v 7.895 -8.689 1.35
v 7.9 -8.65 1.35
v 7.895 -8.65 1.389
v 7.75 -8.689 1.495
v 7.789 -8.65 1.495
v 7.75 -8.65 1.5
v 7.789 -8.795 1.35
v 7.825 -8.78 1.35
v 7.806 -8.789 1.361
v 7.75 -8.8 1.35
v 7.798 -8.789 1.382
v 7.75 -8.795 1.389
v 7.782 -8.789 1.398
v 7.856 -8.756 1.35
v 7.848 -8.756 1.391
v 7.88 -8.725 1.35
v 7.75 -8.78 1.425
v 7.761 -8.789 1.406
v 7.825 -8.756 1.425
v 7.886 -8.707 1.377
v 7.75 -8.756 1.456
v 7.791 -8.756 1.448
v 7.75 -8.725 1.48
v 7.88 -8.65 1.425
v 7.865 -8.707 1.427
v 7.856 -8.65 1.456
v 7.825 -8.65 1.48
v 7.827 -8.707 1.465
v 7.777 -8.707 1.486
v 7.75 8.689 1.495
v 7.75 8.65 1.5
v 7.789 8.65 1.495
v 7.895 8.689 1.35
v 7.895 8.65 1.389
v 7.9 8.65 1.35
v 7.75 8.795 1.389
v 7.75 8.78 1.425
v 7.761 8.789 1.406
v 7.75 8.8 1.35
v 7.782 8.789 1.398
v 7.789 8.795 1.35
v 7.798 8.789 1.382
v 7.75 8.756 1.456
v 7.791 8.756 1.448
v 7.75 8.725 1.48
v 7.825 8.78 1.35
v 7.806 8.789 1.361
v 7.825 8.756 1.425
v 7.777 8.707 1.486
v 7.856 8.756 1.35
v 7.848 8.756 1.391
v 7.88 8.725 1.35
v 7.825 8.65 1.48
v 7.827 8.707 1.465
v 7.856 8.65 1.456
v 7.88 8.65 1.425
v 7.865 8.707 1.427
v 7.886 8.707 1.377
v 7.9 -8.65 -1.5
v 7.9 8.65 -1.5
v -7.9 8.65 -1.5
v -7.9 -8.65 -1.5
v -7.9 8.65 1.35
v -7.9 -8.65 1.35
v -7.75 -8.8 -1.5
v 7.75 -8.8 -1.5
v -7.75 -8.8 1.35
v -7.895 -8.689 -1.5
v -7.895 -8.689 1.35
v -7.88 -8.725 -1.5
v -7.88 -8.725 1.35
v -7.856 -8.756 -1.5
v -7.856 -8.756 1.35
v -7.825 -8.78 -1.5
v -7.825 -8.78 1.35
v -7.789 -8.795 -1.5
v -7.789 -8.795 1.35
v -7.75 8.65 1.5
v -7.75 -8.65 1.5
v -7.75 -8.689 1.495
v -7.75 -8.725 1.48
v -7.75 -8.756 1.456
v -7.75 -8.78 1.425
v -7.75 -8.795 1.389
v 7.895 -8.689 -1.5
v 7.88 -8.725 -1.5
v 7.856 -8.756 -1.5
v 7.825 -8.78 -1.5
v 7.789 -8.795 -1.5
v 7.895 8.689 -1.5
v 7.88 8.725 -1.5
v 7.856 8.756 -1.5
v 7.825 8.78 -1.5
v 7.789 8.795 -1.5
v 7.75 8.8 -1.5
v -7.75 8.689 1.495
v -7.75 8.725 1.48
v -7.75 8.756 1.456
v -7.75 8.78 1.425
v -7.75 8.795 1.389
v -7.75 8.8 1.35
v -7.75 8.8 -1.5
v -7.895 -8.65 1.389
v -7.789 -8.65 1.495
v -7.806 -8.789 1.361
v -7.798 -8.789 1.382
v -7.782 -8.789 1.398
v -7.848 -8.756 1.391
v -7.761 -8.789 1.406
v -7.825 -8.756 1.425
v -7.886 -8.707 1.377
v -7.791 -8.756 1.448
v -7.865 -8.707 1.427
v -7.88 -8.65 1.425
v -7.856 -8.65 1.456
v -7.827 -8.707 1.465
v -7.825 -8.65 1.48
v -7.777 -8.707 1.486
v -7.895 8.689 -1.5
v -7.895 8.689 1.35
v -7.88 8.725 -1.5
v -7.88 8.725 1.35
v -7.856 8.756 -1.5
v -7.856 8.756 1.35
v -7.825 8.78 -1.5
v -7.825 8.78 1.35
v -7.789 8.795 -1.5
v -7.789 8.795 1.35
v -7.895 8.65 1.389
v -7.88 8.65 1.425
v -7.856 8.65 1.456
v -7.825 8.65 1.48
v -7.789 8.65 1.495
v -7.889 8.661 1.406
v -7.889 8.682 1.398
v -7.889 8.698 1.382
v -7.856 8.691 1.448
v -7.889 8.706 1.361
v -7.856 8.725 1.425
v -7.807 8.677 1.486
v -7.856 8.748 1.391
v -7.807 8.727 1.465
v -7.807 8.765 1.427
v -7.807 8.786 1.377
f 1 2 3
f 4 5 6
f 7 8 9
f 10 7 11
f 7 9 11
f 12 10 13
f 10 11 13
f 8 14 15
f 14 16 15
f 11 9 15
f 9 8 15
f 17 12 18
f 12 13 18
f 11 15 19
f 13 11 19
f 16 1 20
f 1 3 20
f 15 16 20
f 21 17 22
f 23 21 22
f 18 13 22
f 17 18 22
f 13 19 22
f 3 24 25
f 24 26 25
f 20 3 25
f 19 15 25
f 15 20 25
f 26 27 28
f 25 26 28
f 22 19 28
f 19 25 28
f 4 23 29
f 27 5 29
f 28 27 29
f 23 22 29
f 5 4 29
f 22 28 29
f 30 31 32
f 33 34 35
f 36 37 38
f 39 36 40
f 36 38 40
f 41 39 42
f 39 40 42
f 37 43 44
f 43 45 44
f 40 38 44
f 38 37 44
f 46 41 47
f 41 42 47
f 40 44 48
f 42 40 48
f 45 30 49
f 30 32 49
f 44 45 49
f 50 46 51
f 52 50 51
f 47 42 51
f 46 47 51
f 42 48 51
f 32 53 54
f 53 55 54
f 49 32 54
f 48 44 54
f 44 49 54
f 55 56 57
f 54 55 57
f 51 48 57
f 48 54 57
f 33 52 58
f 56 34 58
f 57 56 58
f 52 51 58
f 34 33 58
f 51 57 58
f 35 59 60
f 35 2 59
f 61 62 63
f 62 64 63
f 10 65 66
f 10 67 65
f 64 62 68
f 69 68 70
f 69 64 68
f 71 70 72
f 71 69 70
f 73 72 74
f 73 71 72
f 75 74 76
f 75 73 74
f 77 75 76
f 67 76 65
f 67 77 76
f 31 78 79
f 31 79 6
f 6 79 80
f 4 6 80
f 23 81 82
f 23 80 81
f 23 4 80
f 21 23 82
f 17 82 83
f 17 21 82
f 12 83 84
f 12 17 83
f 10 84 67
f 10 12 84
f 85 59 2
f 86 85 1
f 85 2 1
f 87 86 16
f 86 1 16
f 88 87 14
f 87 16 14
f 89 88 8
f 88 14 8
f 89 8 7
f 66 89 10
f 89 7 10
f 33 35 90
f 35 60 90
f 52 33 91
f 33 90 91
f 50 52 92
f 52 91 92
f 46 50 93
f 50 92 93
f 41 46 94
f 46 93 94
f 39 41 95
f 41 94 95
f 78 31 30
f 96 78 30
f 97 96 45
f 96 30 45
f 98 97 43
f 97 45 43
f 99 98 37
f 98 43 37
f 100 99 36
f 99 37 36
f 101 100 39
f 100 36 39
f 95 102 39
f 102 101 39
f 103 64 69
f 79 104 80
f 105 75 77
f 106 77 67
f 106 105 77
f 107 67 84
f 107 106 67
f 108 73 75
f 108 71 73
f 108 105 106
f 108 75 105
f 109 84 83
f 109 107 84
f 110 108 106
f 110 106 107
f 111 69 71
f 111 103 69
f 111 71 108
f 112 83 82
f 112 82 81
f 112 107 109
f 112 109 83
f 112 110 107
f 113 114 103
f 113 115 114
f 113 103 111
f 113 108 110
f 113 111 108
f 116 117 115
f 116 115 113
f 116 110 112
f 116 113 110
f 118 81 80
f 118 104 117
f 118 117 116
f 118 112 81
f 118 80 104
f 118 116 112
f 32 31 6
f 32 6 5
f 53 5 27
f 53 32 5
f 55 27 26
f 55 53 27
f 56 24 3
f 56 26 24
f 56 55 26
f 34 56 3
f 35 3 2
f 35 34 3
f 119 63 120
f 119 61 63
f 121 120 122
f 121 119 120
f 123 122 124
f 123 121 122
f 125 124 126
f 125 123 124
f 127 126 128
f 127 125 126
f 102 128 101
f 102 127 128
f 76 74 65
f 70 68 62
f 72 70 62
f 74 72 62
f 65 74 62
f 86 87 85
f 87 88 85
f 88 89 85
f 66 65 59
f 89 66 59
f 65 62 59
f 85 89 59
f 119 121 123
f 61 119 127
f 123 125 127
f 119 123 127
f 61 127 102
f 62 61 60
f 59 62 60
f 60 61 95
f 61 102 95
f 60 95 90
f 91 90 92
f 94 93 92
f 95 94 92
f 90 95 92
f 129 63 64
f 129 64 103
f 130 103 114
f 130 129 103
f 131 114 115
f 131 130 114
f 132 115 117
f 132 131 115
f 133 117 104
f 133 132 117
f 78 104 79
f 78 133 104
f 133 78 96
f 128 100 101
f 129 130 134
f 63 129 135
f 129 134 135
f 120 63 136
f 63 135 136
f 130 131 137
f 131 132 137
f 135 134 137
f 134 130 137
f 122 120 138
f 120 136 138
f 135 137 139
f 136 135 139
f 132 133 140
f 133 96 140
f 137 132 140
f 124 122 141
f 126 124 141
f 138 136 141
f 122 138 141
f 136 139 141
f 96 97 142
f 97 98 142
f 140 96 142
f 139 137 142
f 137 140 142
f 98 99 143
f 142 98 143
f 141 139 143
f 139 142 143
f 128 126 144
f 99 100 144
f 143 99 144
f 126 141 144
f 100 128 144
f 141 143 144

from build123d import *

# Parameters (mm, degrees)
ESBO_O1_W                = 15.8
ESBO_O1_H                = 17.6
RESSALTO_EXTRUS_O1_DEPTH = 1.5
FILETE1_R                = 0.15


with BuildPart() as part:
    # Esboço1 → Ressalto-extrusão1 (new, symmetric)
    with BuildSketch(Plane.XY):
        Rectangle(ESBO_O1_W, ESBO_O1_H)
    extrude(amount=RESSALTO_EXTRUS_O1_DEPTH, both=True)

    # Filete1
    filete1_edges = [part.edges().sort_by_distance(p)[0] for p in [
        (7.9, 0, 1.5),
        (0, 8.8, 1.5),
        (-7.9, 0, 1.5),
        (-7.9, 8.8, 0),
        (7.9, 8.8, 0),
        (7.9, -8.8, 0),
        (-7.9, -8.8, 0),
        (0, -8.8, 1.5),
    ]]
    fillet(filete1_edges, radius=FILETE1_R)


solid = part.part
